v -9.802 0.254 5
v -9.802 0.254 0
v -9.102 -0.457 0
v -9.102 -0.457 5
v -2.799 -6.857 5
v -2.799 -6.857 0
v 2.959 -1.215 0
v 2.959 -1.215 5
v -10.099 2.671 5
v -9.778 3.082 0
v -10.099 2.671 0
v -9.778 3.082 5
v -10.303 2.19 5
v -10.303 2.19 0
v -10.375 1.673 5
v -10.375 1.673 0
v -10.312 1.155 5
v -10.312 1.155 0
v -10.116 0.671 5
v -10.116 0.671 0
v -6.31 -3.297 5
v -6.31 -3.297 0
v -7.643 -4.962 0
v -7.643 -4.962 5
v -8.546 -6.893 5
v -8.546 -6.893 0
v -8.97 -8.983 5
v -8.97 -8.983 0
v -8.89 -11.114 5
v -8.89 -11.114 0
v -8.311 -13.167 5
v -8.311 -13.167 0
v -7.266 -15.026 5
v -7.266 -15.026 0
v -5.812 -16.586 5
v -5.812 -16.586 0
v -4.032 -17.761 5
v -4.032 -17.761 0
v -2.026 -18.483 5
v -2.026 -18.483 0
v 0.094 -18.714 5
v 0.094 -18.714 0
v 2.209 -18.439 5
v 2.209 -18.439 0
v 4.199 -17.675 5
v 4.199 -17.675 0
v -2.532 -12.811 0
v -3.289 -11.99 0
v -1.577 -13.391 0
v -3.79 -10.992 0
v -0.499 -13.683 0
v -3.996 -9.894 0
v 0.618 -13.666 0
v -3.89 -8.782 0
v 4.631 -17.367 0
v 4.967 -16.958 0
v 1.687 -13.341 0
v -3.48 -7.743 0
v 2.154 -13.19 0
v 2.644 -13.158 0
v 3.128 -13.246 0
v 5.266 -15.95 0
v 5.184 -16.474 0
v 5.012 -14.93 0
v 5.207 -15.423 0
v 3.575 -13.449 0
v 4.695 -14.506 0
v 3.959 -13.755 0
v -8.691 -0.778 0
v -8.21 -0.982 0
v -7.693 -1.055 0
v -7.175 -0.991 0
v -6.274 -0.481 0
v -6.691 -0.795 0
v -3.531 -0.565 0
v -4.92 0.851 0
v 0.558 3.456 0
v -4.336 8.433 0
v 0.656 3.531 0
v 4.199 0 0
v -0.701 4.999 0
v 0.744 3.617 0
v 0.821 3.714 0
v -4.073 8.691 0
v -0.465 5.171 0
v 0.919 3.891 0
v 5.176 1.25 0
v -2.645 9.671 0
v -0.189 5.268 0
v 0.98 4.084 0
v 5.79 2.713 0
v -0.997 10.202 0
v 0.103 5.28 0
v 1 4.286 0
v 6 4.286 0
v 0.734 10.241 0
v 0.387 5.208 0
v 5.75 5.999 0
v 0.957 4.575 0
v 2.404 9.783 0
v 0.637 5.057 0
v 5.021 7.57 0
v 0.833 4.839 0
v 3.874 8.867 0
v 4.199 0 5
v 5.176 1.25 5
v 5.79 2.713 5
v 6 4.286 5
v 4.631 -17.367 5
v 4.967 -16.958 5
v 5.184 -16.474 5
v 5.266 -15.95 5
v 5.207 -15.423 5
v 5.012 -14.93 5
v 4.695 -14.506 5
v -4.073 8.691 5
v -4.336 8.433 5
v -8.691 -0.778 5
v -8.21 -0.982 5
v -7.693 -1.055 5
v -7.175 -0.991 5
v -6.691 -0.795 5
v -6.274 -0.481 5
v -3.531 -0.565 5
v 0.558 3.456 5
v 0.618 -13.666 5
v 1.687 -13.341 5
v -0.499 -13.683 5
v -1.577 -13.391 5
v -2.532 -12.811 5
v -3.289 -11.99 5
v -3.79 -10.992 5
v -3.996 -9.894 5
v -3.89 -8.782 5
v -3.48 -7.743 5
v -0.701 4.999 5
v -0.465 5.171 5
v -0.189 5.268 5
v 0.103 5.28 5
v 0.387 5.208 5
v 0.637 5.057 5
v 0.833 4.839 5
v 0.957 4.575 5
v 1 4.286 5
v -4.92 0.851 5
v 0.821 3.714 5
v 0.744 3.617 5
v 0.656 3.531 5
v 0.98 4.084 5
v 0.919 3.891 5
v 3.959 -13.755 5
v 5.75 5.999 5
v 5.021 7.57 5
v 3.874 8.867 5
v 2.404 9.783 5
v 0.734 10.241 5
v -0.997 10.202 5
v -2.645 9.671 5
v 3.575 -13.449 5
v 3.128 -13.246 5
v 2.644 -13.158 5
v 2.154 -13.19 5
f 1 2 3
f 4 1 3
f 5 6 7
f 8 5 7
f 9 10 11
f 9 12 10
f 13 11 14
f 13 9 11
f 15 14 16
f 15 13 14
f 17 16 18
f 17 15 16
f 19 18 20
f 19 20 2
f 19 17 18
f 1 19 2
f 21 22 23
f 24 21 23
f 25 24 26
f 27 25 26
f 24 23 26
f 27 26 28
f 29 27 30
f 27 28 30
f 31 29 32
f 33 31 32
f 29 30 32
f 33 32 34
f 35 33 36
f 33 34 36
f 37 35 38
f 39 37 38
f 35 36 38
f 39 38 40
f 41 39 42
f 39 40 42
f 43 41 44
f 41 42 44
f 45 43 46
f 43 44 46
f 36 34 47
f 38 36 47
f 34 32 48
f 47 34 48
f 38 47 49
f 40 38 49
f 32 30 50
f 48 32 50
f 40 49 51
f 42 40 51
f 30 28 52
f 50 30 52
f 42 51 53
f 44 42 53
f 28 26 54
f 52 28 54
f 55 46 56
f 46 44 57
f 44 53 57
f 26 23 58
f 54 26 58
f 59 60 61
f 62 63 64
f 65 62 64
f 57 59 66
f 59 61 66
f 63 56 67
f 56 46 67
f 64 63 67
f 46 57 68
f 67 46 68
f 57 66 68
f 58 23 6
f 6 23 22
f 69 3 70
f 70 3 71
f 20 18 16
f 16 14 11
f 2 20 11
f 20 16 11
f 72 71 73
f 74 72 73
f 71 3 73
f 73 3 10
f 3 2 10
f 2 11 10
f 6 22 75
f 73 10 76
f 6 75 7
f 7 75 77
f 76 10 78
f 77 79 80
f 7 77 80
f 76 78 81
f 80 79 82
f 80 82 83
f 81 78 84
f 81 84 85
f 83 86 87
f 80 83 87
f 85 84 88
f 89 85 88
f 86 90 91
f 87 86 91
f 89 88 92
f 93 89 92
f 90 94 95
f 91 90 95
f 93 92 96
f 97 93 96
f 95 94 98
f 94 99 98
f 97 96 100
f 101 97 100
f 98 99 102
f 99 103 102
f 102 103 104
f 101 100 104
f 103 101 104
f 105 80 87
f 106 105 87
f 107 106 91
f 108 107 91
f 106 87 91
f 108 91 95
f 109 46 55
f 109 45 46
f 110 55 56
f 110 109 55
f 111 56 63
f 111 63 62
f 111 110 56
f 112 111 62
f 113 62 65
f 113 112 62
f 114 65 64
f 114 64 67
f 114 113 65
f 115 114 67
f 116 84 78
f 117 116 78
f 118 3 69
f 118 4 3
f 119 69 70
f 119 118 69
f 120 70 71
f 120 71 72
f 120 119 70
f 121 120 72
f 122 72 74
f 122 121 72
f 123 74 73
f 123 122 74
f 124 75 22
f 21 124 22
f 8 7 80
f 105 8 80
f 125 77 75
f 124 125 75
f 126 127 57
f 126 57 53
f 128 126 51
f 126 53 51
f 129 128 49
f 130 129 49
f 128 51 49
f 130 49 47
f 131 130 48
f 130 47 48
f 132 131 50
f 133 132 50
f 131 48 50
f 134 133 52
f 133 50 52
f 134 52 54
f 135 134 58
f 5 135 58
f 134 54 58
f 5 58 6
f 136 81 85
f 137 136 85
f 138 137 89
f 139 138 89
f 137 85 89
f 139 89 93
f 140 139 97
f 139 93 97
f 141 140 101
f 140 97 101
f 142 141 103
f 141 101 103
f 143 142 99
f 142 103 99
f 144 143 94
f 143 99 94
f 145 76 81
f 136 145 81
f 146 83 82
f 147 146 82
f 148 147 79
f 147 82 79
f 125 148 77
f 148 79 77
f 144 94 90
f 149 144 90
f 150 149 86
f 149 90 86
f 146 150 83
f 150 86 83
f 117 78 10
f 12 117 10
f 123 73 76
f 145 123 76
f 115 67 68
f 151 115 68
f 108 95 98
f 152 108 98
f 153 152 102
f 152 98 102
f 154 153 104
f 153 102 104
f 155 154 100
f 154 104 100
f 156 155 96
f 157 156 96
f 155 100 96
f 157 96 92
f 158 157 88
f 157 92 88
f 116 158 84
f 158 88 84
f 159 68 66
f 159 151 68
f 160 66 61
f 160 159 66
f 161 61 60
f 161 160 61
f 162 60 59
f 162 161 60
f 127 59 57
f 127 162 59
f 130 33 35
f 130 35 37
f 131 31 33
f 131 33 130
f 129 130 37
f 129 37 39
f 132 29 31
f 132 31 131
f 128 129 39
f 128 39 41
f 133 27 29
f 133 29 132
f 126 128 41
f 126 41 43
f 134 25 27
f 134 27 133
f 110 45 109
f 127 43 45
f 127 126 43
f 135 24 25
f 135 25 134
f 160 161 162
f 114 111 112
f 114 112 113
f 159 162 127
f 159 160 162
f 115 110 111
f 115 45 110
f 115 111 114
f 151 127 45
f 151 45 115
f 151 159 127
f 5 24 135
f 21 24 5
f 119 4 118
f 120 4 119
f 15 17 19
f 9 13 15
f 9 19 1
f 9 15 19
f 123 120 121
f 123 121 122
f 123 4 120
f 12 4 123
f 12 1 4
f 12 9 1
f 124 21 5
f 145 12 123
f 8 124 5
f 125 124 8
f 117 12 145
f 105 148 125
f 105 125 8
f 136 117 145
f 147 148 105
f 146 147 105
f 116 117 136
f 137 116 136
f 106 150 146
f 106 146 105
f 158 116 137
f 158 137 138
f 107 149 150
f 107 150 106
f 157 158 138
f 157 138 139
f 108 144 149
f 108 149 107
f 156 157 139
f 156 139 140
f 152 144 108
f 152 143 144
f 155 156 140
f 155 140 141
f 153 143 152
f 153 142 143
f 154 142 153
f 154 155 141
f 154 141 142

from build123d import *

# Parameters (mm, degrees)
F1_DEPTH = 5
F3_R     = 2


# Not quite as in the source:
# - a feature of the source that left no trace in its solid (it failed there, or was rolled back) is left out
# - a feature names something its author has since deleted; it is built from what else it names


with BuildPart() as f1:
    # F0 (on Top) → F1 (new body)
    with BuildSketch(Plane.XY):
        with BuildLine():
            ThreePointArc((1, 4.2856675661), (0.9540832917, 3.9861261291), (0.820549855, 3.7140926057))
            ThreePointArc((0.820549855, 3.7140926057), (0.7011095464, 3.5726139889), (0.5576336696, 3.4555804077))
            Line((0.5576336696, 3.4555804077), (-3.5314378692, -0.5649969839))
            ThreePointArc((-3.5314378692, -0.5649969839), (-3.0925503087, -0.8559404108), (-2.6298440658, -1.1072834062))
            ThreePointArc((-2.6298440658, -1.1072834062), (0, -0.714485053), (2.6298440658, -1.1072834062))
            ThreePointArc((2.6298440658, -1.1072834062), (3.4591021242, -0.6168432696), (4.1991729558, 0))
            ThreePointArc((4.1991729558, 0), (5.531502406, 1.961343765), (6, 4.2856675661))
            ThreePointArc((6, 4.2856675661), (2.4042381835, 9.7829067602), (-4.073212919, 8.6912250242))
            Line((-4.073212919, 8.6912250242), (-4.3361291045, 8.4327128262))
            ThreePointArc((-4.3361291045, 8.4327128262), (-5.9823120662, 4.7460395278), (-4.9195913989, 0.8509011303))
            Line((-4.9195913989, 0.8509011303), (-0.7011096797, 4.9987210123))
            ThreePointArc((-0.7011096797, 4.9987210123), (0.3865813759, 5.2079228669), (1, 4.2856675661))
        make_face()
        with BuildLine():
            ThreePointArc((-2.6298440658, -1.1072834062), (-3.0925503087, -0.8559404108), (-3.5314378692, -0.5649969839))
            Line((-3.5314378692, -0.5649969839), (-6.3099859173, -3.297002858))
            ThreePointArc((-6.3099859173, -3.297002858), (-4.6020493099, -1.9800722021), (-2.6298440658, -1.1072834062))
        make_face()
        with BuildLine():
            Line((-7.7001872259, -1.8831182213), (-4.9195913989, 0.8509011303))
            ThreePointArc((-4.9195913989, 0.8509011303), (-5.9823120662, 4.7460395278), (-4.3361291045, 8.4327128262))
            Line((-4.3361291045, 8.4327128262), (-11.2037486913, 1.6801295606))
            Line((-11.2037486913, 1.6801295606), (-7.7001872259, -1.8831182213))
        make_face()
        with BuildLine():
            ThreePointArc((2.6298440658, -1.1072834062), (0, -0.714485053), (-2.6298440658, -1.1072834062))
            ThreePointArc((-2.6298440658, -1.1072834062), (0, -1.7143324339), (2.6298440658, -1.1072834062))
        make_face()
        with BuildLine():
            ThreePointArc((2.6298440658, -1.1072834062), (0, -1.7143324339), (-2.6298440658, -1.1072834062))
            ThreePointArc((-2.6298440658, -1.1072834062), (-4.6020493099, -1.9800722021), (-6.3099859173, -3.297002858))
            ThreePointArc((-6.3099859173, -3.297002858), (-6.4229942249, -16.018860136), (6.2987594337, -16.1429864022))
            Line((6.2987594337, -16.1429864022), (2.7994486372, -12.5715967638))
            ThreePointArc((2.7994486372, -12.5715967638), (-2.8571117107, -12.5139336903), (-2.7994486372, -6.8573733423))
            Line((-2.7994486372, -6.8573733423), (2.9592441197, -1.2149042257))
            ThreePointArc((2.9592441197, -1.2149042257), (2.7950621185, -1.1595082703), (2.6298440658, -1.1072834062))
        make_face()
        with BuildLine():
            ThreePointArc((4.1991729558, 0), (3.4591021242, -0.6168432696), (2.6298440658, -1.1072834062))
            ThreePointArc((2.6298440658, -1.1072834062), (2.7950621185, -1.1595082703), (2.9592441197, -1.2149042257))
            Line((2.9592441197, -1.2149042257), (4.1991729558, 0))
        make_face()
    extrude(amount=F1_DEPTH)

    # F3
    f3_edges = [f1.edges().sort_by_distance(p)[0] for p in [
        (-11.203749, 1.68013, 2.5),
        (-7.700187, -1.883118, 2.5),
        (6.298759, -16.142986, 2.5),
        (2.799449, -12.571597, 2.5),
    ]]
    fillet(f3_edges, radius=F3_R)


solid = f1.part
